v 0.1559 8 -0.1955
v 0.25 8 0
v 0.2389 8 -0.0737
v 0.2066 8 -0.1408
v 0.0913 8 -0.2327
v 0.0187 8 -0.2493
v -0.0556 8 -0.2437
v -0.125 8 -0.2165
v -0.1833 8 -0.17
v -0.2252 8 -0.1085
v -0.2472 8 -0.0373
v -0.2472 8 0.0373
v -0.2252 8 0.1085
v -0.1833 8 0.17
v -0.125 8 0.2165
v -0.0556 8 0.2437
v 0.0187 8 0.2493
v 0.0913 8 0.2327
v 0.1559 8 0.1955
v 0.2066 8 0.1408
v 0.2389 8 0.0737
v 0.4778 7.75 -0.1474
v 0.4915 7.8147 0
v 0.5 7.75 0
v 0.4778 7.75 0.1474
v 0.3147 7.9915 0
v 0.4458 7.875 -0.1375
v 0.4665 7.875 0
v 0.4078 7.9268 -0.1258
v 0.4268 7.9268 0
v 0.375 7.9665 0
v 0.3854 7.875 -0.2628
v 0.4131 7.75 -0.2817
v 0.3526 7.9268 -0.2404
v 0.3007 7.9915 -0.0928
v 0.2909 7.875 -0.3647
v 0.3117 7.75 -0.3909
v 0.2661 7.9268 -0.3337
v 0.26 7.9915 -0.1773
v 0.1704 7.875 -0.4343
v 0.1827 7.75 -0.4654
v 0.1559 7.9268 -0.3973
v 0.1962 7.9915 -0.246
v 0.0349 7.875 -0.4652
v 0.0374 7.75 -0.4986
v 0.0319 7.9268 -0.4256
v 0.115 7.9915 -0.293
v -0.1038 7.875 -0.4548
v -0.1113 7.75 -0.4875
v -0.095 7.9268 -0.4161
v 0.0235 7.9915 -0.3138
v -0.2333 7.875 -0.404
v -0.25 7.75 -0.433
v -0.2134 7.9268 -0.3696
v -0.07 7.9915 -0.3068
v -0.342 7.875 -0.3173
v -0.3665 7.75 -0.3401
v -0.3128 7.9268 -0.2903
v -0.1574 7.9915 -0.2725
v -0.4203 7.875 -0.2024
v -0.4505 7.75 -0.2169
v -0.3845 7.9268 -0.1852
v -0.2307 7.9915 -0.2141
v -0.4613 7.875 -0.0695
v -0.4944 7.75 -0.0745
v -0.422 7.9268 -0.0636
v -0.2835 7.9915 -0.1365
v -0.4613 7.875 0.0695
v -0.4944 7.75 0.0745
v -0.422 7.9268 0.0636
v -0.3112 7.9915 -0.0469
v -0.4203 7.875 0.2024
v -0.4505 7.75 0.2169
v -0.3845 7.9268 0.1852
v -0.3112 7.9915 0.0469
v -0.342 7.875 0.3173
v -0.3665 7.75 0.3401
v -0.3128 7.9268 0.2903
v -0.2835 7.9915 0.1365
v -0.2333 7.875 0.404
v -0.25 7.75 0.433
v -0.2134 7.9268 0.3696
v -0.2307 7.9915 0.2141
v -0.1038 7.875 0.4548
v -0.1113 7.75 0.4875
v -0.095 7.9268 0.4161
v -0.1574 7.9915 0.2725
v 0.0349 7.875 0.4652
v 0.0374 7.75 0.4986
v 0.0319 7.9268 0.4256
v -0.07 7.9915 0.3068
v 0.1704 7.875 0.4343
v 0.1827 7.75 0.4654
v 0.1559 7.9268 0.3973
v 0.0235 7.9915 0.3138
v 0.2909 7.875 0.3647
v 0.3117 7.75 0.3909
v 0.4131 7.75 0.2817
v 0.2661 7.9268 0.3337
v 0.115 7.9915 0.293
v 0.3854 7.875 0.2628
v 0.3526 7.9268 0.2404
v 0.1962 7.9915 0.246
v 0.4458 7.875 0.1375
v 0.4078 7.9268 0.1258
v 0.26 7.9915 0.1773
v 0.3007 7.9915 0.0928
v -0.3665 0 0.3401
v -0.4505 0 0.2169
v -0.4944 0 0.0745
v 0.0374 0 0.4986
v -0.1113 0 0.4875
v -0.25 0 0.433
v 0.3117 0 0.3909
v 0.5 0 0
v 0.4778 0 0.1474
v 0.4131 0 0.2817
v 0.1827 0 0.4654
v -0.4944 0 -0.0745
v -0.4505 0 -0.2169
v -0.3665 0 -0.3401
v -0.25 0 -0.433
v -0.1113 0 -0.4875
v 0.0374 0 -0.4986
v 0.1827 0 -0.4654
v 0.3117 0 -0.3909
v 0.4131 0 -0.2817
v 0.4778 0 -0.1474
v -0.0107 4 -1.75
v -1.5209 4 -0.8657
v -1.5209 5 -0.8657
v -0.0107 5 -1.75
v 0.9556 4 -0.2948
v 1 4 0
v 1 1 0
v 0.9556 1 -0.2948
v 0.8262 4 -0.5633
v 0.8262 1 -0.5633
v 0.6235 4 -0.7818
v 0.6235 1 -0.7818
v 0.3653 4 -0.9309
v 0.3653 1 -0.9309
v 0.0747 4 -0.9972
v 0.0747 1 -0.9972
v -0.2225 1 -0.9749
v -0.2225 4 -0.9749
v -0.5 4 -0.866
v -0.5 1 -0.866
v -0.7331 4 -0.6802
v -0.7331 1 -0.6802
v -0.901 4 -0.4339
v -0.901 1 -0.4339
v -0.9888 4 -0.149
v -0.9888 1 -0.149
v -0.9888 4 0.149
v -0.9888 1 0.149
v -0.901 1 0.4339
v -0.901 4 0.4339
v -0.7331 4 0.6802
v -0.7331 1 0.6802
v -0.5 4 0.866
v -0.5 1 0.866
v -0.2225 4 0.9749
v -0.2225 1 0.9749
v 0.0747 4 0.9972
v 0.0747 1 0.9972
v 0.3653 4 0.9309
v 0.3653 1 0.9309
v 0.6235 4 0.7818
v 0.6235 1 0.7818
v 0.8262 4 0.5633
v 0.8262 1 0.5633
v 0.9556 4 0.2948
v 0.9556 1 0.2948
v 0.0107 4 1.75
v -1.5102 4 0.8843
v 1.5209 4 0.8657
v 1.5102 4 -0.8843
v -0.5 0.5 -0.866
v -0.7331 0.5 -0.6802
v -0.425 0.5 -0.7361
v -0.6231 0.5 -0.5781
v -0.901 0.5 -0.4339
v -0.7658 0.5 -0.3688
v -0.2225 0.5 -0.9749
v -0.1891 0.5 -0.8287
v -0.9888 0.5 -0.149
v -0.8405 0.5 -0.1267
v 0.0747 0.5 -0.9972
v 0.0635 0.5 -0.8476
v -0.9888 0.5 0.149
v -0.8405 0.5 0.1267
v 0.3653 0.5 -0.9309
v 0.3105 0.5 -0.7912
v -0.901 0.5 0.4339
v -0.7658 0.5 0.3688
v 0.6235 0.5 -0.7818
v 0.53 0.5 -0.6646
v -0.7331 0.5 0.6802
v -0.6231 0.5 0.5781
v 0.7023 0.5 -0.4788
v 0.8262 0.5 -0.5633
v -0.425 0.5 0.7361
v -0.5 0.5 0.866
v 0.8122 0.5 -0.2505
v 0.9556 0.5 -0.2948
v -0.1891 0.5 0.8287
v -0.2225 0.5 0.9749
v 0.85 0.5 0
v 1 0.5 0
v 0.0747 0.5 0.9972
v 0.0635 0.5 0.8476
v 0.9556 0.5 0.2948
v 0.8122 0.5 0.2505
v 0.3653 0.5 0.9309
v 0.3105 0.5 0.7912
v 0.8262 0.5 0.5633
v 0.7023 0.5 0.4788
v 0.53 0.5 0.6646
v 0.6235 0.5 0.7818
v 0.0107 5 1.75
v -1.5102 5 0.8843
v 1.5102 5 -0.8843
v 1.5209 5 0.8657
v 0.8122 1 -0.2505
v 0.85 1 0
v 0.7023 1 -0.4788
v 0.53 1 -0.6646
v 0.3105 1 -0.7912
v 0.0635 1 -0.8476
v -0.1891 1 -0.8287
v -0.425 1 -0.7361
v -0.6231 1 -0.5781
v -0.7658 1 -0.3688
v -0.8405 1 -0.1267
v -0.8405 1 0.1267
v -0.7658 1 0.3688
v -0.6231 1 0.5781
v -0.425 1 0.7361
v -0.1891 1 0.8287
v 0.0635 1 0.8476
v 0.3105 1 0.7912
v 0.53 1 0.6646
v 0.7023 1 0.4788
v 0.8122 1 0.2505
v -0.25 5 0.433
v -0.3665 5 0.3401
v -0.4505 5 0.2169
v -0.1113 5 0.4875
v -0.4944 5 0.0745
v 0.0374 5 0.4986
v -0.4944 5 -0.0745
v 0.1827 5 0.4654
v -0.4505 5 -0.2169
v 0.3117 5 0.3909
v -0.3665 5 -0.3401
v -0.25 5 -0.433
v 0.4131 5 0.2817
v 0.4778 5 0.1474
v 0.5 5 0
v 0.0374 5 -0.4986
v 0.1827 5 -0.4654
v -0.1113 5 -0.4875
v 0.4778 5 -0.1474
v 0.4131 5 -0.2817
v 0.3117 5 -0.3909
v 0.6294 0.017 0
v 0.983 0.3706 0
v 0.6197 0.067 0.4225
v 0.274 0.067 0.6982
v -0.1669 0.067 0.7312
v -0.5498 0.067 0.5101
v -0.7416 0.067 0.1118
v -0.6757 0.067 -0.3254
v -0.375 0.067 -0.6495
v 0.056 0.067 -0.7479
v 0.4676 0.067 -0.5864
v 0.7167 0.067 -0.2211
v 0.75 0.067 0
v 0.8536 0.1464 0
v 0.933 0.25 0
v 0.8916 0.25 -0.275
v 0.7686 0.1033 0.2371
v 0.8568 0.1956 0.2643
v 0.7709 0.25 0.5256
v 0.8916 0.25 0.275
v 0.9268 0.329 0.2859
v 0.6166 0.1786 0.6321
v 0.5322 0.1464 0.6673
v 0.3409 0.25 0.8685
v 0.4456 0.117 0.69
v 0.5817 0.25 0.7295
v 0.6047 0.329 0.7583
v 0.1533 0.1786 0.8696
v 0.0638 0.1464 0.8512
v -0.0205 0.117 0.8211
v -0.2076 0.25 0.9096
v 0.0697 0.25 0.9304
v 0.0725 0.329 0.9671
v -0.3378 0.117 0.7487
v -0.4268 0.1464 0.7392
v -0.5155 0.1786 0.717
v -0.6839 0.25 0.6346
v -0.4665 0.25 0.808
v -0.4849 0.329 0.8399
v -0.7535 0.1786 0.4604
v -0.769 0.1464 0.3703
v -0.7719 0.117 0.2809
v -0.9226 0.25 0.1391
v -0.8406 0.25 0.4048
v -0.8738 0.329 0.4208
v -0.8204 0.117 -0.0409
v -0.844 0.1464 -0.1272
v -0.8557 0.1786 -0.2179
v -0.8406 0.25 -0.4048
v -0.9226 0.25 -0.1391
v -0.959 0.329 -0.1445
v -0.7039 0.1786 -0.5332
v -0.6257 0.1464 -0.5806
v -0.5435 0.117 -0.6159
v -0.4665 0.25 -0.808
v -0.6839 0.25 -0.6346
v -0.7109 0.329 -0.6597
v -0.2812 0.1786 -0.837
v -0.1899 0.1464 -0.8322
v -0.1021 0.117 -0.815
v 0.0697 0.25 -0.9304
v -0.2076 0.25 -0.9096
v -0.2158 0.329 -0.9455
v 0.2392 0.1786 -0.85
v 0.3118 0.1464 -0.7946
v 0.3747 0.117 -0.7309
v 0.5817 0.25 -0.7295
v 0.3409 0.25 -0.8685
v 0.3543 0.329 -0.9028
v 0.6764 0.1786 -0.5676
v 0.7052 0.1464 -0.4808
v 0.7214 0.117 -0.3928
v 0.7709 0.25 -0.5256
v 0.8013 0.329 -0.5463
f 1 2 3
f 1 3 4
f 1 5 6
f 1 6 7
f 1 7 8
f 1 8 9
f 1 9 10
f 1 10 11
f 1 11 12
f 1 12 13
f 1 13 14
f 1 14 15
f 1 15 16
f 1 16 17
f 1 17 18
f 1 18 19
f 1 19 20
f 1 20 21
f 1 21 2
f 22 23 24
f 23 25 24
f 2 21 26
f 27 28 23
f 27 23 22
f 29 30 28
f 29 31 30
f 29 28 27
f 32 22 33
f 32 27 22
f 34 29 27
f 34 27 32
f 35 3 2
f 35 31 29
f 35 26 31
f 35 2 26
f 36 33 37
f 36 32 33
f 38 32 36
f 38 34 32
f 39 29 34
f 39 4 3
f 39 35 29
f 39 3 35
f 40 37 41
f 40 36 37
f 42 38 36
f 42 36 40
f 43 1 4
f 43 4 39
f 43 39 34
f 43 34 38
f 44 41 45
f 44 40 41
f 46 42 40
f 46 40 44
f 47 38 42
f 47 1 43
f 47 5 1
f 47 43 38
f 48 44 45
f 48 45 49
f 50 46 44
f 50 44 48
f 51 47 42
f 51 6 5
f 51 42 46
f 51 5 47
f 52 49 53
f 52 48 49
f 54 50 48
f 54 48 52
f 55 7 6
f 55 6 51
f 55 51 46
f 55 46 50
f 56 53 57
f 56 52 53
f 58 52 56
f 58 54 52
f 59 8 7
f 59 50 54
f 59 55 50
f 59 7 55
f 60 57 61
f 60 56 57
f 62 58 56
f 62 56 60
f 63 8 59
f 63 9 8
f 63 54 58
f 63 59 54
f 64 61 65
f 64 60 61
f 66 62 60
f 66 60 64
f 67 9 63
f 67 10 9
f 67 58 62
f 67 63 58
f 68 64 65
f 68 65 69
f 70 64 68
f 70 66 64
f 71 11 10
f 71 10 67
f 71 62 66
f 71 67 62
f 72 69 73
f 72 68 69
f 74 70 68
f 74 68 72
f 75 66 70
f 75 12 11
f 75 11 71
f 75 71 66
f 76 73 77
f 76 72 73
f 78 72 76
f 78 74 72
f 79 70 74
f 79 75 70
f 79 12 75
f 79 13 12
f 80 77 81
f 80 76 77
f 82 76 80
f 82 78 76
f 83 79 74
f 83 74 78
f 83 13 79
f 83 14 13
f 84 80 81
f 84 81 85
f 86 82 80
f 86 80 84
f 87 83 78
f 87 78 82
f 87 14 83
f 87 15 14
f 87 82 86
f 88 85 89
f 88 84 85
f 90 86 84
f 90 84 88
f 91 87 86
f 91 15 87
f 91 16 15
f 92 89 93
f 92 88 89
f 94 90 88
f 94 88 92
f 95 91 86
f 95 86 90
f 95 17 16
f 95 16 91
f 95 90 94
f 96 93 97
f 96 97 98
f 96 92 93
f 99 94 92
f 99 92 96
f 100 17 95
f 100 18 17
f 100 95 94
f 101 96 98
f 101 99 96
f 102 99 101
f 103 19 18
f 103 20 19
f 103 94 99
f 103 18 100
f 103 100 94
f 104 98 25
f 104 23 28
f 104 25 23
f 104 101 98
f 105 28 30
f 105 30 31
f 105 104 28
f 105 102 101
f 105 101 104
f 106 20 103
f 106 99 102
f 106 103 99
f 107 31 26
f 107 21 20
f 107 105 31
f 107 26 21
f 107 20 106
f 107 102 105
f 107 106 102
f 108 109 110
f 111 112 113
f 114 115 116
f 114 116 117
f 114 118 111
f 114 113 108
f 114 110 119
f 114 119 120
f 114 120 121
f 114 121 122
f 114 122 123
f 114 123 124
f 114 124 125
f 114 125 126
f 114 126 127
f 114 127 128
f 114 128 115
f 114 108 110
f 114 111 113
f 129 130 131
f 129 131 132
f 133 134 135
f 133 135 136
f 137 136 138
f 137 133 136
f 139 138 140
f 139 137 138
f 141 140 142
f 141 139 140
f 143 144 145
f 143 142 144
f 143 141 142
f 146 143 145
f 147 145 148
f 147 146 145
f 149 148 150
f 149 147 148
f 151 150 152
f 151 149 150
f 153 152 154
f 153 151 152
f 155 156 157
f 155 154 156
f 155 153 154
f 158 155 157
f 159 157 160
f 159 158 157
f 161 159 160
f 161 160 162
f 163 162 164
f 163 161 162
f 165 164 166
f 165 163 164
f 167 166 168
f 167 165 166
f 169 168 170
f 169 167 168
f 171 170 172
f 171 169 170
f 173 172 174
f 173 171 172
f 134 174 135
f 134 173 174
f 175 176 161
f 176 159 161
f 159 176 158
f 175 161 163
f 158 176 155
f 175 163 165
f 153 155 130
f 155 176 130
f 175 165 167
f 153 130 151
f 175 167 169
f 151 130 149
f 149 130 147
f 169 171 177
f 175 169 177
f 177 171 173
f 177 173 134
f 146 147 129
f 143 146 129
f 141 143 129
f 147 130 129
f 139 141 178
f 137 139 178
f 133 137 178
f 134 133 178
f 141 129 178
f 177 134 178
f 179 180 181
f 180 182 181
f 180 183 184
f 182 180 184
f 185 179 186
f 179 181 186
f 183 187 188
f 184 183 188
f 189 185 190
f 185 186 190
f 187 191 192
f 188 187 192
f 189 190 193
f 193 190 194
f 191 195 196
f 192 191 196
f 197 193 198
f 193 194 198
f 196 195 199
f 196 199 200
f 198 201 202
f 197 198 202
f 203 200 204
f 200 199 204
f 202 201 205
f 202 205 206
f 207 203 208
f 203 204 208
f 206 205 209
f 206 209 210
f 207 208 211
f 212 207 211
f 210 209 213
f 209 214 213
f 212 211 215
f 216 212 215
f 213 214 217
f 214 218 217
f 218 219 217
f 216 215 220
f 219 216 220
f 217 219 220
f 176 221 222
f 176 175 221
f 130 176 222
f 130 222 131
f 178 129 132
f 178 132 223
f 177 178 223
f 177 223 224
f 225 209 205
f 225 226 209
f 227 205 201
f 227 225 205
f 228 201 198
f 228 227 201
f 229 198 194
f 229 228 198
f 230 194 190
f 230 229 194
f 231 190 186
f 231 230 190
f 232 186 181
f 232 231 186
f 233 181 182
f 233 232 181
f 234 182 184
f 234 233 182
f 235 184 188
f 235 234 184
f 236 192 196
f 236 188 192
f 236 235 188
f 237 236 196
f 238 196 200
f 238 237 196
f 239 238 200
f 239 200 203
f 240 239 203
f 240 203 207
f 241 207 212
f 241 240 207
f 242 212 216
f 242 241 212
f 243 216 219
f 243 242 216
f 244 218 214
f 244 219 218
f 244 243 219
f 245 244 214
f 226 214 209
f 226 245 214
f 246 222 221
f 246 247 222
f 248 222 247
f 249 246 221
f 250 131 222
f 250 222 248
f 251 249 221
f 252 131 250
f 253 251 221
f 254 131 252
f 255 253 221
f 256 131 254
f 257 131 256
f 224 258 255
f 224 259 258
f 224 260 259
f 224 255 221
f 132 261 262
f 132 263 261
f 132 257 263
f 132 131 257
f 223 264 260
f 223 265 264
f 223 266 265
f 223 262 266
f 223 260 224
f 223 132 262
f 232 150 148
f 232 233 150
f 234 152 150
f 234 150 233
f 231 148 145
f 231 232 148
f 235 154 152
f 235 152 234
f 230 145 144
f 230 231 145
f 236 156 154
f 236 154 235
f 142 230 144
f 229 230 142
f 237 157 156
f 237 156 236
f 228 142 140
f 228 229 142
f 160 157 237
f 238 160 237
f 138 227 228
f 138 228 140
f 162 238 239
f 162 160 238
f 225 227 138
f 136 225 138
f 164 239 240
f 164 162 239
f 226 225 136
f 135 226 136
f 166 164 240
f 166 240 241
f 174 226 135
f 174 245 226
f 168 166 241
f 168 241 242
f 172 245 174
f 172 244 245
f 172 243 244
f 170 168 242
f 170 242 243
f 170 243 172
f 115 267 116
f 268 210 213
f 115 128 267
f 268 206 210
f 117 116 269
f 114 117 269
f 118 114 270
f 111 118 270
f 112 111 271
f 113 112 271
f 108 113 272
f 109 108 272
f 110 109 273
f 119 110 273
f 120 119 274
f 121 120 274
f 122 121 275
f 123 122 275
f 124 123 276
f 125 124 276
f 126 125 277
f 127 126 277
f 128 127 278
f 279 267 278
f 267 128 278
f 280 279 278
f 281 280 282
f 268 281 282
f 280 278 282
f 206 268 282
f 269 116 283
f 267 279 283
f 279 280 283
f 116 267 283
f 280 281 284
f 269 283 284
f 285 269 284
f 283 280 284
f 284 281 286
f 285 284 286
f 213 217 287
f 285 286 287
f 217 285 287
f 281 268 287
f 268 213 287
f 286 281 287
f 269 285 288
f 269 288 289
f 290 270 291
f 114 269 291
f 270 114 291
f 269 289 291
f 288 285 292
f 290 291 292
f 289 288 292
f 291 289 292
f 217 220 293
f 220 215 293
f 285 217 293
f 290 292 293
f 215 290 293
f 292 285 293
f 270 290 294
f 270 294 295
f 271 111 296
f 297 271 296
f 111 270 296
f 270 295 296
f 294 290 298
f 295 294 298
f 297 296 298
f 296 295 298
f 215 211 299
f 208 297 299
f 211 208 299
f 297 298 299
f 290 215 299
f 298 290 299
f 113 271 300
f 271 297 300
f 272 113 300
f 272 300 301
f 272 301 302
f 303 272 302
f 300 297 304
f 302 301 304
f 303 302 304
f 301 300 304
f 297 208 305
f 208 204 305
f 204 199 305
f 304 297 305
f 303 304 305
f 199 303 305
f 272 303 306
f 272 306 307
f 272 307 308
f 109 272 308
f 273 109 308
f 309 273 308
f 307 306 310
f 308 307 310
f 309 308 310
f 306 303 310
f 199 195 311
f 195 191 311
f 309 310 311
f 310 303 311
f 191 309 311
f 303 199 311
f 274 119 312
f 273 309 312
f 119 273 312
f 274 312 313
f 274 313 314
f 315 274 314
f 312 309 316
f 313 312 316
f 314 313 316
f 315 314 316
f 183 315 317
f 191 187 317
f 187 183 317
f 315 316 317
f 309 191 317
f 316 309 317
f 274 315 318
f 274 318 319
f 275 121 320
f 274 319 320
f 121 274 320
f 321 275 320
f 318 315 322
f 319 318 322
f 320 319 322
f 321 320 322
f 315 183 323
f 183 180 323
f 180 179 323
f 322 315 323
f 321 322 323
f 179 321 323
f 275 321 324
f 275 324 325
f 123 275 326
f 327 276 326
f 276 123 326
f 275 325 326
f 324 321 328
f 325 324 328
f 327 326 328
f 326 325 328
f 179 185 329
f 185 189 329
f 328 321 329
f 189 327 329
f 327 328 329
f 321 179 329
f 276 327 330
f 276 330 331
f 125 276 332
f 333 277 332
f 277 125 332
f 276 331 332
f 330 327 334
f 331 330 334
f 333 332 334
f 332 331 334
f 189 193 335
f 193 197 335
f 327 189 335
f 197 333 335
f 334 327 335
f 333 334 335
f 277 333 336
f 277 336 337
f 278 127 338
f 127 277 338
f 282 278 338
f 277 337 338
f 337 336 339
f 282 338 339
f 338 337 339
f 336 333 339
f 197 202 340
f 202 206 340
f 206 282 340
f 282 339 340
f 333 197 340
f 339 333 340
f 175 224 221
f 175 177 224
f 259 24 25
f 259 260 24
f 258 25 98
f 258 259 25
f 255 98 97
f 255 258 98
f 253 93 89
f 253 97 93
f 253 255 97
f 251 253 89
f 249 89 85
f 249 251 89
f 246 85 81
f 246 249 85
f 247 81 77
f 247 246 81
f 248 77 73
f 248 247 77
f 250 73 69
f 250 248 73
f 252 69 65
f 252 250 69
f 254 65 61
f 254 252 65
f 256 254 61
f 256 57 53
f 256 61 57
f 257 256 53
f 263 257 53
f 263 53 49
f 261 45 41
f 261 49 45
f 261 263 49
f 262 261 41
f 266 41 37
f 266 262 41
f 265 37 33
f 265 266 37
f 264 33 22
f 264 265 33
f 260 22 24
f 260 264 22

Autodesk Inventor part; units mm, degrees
ref_plane "YZ Plane" through (0, 0, 0) normal (1, 0, 0) x (0, 1, 0)
ref_plane "XZ Plane" through (0, 0, 0) normal (0, 1, 0) x (-1, 0, 0)
ref_plane "XY Plane" through (0, 0, 0) normal (0, 0, 1) x (1, 0, 0)
sketch "Sketch1" plane through (0, 0, 0) normal (0, 0, 1) x (1, 0, 0)
  line L0 (0, 0) -> (0.5, 0)
  line L1 (1, 1) -> (1, 4)
  line L2 (1, 4) -> (0, 4)
  line L3 (0, 4) -> (0, 0)
  arc A0 (0.5, 0) -> (1, 0.5) centre (0.5, 0.5) ccw
  line L4 (1, 0.5) -> (0.85, 0.5)
  line L5 (0.85, 0.5) -> (0.85, 1)
  line L6 (0.85, 1) -> (1, 1)
  point P0 (1, 0)
  dimension "d0" = 1
  dimension "d1" = 4
  dimension "d2" = 0.5
  dimension "d6" = 0.15
  dimension "d7" = 0.5
revolve "Revolution1" add sketch "Sketch1" angle 360 about axis through (0, 4, 0) along (0, -1, 0)
thread "Thread1" size "M2x0.4" class "6g" standard "ISO Metric profile" length 3
sketch "Sketch2" plane through (0, 4, 0) normal (0, 1, 0) x (1, 0, 0)
  circle A0 centre (0, 0) radius 0.5 projected
  circle A1 centre (0, 0) radius 1.75 construction
  line L0 (-1.5102, -0.8843) -> (-1.5209, 0.8657)
  line L1 (-1.5209, 0.8657) -> (-0.0107, 1.75)
  line L2 (-0.0107, 1.75) -> (1.5102, 0.8843)
  line L3 (1.5102, 0.8843) -> (1.5209, -0.8657)
  line L4 (1.5209, -0.8657) -> (0.0107, -1.75)
  line L5 (0.0107, -1.75) -> (-1.5102, -0.8843)
  dimension "d8" = 3.5
extrude "Extrusion1" add sketch "Sketch2" along normal blind 1
extrude "Extrusion2" add sketch "Sketch2" along normal blind 4 contours A0
fillet "Fillet1" radius 0.25 1 edges at (-0.5, 8, 0)
properties part number "temperature sensor"
